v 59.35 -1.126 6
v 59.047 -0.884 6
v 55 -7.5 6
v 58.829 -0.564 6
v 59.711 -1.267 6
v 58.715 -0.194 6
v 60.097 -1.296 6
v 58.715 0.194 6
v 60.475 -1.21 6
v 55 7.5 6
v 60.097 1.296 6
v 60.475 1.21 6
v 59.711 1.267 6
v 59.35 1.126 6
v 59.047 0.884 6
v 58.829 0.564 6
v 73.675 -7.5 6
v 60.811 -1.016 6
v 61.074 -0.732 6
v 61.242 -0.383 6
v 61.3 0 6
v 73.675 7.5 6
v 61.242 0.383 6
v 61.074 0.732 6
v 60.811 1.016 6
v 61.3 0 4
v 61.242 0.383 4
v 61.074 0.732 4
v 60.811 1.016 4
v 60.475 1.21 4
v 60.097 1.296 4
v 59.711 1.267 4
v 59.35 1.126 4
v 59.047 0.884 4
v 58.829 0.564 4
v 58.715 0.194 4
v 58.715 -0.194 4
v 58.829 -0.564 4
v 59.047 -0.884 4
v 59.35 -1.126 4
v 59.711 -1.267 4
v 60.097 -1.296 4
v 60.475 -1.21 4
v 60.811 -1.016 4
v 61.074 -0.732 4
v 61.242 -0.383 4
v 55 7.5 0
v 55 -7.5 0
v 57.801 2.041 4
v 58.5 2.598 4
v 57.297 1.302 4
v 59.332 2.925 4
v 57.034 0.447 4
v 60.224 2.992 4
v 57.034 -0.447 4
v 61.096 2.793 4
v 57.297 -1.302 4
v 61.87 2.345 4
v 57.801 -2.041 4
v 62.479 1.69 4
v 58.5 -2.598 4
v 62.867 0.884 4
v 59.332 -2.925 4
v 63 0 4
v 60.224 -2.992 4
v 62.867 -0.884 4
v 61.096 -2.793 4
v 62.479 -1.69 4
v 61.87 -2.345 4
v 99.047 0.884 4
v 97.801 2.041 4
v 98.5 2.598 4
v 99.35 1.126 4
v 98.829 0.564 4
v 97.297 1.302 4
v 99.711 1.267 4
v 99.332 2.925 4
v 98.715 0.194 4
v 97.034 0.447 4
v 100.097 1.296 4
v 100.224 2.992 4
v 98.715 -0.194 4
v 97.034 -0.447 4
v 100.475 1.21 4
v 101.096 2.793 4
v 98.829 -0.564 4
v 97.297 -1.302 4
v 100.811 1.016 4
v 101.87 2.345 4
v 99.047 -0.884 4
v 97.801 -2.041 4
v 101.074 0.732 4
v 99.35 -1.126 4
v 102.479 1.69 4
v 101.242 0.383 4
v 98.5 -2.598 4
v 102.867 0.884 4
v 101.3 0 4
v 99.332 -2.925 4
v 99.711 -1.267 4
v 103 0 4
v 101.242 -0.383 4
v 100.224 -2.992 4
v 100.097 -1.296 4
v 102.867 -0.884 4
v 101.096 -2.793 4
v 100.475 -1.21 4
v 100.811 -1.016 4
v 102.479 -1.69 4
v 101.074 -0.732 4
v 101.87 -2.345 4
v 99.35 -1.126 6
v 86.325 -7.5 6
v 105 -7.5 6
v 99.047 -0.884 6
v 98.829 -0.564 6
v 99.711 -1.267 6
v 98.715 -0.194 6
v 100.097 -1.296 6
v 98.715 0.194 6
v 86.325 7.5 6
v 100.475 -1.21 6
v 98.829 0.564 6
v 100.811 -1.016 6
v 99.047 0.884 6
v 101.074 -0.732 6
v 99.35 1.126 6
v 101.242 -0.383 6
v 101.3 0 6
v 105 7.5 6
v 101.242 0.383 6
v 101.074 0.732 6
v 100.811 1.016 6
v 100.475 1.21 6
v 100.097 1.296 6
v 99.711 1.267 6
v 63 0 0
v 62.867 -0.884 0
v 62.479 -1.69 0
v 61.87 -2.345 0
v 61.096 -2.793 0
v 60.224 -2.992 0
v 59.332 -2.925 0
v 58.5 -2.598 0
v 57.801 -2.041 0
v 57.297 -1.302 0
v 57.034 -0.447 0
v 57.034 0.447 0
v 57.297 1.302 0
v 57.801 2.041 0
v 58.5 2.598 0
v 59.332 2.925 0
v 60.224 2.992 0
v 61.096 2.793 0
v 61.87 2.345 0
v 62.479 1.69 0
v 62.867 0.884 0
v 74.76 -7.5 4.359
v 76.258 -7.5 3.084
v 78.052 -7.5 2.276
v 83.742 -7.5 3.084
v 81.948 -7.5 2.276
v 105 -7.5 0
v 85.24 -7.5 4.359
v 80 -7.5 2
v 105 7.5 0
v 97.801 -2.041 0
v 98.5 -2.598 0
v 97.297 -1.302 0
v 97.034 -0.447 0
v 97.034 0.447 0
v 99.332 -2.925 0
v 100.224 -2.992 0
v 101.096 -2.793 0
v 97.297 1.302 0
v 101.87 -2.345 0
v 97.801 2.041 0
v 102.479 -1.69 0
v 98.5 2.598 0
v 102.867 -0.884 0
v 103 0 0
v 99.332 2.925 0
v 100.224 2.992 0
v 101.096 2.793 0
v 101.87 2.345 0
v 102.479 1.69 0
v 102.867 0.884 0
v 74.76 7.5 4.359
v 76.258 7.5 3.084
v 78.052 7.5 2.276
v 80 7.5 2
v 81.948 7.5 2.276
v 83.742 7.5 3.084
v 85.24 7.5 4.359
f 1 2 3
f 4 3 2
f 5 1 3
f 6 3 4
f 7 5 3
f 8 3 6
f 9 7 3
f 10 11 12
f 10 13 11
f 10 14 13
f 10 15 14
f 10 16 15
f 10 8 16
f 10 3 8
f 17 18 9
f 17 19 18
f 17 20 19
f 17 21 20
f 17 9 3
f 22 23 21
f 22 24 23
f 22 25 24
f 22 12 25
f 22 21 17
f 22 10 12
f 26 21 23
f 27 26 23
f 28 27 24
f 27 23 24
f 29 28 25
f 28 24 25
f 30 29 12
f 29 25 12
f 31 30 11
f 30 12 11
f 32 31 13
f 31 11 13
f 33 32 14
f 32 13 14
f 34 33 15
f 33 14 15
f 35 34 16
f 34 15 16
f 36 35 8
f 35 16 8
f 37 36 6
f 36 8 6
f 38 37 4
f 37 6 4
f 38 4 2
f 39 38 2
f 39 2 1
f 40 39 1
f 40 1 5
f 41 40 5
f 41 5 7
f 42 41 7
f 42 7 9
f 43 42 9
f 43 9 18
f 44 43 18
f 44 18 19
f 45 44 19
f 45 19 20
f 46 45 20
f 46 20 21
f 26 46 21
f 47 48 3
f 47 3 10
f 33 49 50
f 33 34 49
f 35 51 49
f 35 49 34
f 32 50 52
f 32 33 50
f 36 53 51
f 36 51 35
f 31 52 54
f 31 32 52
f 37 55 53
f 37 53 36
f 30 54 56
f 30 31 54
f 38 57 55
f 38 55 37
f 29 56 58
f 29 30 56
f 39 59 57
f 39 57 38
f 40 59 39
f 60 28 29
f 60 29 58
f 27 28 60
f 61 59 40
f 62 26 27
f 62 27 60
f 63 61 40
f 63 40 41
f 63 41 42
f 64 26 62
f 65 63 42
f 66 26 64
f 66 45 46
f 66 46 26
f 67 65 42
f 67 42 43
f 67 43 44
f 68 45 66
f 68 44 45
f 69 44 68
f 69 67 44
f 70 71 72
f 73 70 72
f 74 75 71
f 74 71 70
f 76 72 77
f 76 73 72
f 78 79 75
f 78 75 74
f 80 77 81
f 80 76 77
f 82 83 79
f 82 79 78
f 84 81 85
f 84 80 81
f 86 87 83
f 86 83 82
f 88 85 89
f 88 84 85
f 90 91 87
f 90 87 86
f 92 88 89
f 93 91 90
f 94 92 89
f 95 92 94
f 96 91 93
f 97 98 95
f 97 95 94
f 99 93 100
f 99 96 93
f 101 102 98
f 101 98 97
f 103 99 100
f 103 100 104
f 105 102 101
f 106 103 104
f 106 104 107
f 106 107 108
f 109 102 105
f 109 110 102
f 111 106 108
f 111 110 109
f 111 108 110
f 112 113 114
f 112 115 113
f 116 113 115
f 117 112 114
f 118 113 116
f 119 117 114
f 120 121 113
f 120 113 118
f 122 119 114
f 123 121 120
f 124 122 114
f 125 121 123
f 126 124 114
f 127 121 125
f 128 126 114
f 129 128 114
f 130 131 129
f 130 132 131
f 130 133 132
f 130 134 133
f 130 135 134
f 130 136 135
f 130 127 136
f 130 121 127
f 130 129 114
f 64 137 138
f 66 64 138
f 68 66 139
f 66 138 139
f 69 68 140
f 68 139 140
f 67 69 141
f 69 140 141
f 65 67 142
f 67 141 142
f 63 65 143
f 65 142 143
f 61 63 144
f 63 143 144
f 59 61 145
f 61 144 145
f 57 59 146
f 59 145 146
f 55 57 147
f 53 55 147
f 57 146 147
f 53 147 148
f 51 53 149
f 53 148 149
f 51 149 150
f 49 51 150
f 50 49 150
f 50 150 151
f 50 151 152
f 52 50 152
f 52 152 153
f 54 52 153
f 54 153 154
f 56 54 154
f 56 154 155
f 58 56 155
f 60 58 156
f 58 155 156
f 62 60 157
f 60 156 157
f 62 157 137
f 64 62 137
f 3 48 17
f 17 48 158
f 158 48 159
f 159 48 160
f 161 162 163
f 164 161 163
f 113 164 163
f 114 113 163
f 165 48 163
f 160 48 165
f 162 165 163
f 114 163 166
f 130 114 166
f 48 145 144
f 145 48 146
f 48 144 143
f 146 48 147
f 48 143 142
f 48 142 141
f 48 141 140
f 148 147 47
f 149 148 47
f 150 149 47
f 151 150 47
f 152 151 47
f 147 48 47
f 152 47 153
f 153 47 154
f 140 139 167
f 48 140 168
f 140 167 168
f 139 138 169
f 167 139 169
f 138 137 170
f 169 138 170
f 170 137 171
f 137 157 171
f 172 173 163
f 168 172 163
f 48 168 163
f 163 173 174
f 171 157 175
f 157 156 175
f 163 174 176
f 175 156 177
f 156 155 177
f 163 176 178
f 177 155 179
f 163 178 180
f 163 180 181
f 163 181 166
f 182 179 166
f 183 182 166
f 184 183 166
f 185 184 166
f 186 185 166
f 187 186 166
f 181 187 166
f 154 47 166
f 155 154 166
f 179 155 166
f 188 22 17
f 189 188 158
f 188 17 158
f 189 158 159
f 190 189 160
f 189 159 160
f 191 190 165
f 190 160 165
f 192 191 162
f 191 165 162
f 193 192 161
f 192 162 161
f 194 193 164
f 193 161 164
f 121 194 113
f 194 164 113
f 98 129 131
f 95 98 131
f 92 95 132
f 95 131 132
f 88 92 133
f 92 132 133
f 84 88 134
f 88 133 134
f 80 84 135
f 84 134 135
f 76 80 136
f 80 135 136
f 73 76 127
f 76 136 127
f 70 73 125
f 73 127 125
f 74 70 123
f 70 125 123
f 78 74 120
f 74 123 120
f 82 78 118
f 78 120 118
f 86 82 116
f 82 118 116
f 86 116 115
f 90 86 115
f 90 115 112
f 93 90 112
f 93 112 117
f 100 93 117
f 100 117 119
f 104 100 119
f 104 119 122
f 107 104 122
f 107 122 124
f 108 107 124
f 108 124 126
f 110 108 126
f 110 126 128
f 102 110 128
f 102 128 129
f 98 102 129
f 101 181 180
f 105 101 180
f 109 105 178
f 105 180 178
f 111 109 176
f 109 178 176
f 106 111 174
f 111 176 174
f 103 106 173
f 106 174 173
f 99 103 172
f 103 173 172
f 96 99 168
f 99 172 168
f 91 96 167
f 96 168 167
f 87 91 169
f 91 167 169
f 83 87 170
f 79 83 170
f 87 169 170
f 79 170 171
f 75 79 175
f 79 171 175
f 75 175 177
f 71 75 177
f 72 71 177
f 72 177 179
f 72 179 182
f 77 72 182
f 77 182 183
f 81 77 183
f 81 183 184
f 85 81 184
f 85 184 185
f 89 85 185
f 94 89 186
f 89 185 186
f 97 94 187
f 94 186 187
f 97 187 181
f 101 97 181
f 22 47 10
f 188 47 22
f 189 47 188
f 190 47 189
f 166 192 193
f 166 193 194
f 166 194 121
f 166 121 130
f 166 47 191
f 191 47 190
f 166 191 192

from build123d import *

# Parameters (mm, degrees)
SKETCH_W        = 50
SKETCH_H        = 15
PAD_DEPTH       = 6
SKETCH001_R     = 7
POCKET_DEPTH    = 15.001
SKETCH002_R     = 1.3
POCKET001_DEPTH = 6.001
SKETCH018_R     = 3
POCKET013_DEPTH = 4


with BuildPart() as part:
    # Sketch → Pad (new body)
    with BuildSketch(Plane.XY):
        Rectangle(SKETCH_W, SKETCH_H)
    extrude(amount=PAD_DEPTH)

    # Sketch001 (on Face3 of Pad) → Pocket (cut, through all)
    with BuildSketch(Plane.XZ.offset(7.5)):
        with Locations((0, 9)):
            Circle(SKETCH001_R)
    extrude(amount=-POCKET_DEPTH, mode=Mode.SUBTRACT)

    # Sketch002 (on Face6 of Pad) → Pocket001 (cut, through all)
    with BuildSketch(Plane.XY.offset(6)):
        with Locations((-20, 0)):
            Circle(SKETCH002_R)
        with Locations((20, 0)):
            Circle(SKETCH002_R)
    extrude(amount=-POCKET001_DEPTH, mode=Mode.SUBTRACT)

    # Sketch018 (on Face2 of Pocket001) → Pocket013 (cut)
    with BuildSketch(Plane(origin=(0, 0, 0), x_dir=(1, 0, 0), z_dir=(0, 0, -1))):
        with Locations((-20, 0)):
            Circle(SKETCH018_R)
        with Locations((20, 0)):
            Circle(SKETCH018_R)
    extrude(amount=-POCKET013_DEPTH, mode=Mode.SUBTRACT)


with BuildPart() as part_1:
    # Body placement: moved
    add(part.part.moved(Location((80, 0, 0))))


solid = part_1.part
